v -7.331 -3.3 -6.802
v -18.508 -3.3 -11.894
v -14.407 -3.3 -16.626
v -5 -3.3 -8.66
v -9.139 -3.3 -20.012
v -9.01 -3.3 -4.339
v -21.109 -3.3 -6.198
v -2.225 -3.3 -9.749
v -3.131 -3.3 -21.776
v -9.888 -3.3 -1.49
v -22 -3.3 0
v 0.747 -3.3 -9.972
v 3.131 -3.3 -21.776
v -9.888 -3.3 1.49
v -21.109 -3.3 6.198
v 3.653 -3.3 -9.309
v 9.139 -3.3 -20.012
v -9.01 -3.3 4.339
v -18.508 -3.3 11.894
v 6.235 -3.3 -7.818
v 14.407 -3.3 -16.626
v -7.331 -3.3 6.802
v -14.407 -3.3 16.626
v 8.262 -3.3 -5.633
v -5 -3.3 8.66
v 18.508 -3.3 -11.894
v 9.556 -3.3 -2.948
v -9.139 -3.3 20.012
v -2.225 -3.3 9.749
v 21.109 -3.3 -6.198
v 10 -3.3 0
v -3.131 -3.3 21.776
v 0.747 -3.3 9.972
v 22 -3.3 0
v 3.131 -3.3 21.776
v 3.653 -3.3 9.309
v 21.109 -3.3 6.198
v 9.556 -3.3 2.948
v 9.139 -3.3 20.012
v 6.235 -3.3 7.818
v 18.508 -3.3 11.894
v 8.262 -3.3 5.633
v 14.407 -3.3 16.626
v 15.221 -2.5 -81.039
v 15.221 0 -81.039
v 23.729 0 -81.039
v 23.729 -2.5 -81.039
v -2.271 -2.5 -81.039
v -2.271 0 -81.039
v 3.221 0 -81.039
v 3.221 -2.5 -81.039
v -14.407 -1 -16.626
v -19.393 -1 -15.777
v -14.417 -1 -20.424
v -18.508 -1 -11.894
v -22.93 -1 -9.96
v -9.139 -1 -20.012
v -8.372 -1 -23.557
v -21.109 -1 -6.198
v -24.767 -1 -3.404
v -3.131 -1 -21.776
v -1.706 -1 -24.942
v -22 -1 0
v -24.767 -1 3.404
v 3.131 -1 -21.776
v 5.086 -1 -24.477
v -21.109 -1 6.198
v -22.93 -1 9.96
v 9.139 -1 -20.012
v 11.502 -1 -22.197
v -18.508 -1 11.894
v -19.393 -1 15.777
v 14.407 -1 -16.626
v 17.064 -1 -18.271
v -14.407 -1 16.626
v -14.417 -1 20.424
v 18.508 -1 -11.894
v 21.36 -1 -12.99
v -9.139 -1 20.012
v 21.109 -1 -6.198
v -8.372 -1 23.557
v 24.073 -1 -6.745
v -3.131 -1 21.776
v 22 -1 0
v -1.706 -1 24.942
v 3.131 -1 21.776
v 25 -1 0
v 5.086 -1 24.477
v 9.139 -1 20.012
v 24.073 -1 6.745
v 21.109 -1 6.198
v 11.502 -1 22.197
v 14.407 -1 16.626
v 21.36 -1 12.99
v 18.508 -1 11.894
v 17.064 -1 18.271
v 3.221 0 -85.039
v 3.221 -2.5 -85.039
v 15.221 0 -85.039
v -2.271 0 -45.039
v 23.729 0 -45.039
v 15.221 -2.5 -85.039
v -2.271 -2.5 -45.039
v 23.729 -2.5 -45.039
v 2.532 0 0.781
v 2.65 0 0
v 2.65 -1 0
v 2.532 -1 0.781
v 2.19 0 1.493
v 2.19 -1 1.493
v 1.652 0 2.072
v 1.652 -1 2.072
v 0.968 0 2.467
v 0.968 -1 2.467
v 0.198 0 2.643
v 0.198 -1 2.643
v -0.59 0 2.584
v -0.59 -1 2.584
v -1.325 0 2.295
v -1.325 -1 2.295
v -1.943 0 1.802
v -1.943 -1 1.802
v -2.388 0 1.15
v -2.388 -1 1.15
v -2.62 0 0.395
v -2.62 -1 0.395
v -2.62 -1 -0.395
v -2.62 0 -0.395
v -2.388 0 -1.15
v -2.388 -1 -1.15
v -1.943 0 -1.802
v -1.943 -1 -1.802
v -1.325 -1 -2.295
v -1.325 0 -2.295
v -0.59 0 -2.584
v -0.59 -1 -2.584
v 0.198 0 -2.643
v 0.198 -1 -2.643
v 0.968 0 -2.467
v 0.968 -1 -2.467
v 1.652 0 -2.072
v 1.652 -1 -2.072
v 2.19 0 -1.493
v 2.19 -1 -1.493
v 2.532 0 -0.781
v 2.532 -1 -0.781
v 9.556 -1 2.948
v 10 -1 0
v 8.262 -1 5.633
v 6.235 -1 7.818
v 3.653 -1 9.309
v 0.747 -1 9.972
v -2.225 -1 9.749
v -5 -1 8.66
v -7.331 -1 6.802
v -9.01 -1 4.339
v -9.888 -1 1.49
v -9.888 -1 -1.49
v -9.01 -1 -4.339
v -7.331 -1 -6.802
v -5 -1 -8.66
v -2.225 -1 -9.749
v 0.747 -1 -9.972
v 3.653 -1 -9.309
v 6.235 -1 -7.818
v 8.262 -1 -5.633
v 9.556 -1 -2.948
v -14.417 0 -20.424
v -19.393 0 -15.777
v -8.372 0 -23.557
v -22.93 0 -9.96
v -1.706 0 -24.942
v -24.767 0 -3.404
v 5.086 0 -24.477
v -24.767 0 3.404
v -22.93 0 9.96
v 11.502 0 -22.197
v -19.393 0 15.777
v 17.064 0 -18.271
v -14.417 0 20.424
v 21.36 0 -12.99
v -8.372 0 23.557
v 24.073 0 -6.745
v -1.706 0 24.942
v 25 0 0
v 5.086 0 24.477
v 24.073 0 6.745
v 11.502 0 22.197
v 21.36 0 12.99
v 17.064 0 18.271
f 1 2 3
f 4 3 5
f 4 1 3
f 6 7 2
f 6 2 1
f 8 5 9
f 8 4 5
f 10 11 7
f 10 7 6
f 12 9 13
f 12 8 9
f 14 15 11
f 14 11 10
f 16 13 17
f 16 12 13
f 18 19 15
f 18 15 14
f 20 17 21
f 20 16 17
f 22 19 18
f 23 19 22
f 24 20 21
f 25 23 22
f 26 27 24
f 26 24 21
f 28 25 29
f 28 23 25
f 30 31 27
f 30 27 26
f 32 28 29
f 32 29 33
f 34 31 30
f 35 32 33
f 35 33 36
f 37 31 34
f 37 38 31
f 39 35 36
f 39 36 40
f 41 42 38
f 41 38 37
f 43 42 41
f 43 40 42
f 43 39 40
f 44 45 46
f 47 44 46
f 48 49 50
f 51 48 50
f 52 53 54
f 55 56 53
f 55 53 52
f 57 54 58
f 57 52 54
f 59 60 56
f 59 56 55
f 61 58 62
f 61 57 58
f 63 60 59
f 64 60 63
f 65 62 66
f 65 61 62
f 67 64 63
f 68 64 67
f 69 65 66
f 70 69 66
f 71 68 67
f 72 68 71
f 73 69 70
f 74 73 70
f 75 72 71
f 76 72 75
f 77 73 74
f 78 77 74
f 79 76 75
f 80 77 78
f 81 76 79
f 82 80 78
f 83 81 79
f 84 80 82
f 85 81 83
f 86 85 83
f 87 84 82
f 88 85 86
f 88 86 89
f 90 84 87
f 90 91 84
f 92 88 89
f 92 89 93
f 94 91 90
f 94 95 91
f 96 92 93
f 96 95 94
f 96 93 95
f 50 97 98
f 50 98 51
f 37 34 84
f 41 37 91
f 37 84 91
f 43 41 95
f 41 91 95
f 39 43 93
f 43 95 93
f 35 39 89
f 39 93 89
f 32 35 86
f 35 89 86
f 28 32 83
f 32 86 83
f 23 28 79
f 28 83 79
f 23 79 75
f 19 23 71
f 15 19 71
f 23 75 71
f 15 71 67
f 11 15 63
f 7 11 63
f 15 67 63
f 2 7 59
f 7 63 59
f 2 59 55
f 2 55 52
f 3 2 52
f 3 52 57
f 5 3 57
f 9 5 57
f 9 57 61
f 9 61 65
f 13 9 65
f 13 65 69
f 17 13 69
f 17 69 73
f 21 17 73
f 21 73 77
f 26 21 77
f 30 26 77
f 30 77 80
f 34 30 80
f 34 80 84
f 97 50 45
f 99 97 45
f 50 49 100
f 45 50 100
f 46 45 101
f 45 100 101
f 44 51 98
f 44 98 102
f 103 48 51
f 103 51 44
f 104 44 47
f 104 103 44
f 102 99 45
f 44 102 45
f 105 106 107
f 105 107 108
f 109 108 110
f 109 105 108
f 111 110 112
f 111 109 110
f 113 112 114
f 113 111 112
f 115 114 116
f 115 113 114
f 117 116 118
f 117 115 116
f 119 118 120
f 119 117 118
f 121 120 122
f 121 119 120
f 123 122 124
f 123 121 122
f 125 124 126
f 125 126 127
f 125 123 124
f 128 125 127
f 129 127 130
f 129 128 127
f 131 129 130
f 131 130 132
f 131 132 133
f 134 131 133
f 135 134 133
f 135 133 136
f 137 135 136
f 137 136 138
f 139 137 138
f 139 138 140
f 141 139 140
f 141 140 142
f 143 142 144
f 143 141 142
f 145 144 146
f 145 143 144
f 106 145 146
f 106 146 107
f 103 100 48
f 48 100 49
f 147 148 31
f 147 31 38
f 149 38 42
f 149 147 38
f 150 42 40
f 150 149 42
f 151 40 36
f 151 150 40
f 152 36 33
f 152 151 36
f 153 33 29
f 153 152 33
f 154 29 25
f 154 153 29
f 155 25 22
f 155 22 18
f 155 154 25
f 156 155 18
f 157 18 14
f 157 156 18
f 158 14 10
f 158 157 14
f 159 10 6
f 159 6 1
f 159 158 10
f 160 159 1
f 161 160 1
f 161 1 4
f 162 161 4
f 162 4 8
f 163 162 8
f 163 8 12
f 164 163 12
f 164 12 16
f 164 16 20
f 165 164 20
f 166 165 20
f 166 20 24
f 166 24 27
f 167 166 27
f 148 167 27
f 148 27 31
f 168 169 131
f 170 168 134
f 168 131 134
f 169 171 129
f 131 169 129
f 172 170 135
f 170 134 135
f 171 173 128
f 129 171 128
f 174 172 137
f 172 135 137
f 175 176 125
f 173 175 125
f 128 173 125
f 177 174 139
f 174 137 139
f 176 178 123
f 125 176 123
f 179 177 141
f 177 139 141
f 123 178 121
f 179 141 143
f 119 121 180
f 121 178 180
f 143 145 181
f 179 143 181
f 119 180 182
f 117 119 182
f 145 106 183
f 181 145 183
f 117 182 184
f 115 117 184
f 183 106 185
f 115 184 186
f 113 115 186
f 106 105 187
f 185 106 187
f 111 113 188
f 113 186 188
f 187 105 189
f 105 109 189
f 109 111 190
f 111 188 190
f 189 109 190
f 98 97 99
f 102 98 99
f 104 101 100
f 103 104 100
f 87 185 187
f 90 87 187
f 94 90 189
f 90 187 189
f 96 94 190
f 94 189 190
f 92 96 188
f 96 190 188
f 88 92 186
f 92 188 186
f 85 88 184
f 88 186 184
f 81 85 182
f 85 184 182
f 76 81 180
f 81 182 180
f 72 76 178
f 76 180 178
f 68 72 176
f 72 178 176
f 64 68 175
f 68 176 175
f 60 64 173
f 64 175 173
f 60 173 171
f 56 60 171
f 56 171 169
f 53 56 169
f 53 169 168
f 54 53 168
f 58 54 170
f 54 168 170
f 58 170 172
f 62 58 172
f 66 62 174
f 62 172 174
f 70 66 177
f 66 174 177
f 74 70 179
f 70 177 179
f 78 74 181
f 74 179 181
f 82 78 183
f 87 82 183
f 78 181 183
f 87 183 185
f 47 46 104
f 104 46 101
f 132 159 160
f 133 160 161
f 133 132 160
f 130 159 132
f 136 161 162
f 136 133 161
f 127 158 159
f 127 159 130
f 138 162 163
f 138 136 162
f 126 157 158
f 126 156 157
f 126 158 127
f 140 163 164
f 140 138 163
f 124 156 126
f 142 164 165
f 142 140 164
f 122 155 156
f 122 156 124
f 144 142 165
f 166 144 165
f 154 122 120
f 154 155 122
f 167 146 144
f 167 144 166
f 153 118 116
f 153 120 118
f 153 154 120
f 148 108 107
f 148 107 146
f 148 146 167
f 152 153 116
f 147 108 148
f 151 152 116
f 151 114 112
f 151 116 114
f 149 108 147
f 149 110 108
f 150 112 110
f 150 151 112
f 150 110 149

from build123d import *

# Parameters (mm, degrees)
F0_R     = 25
F0_R_2   = 22
F0_R_3   = 10
F0_R_4   = 2.65
F1_DEPTH = 1
F2_DEPTH = 3.3
F3_W     = 12
F3_H     = 4
F4_DEPTH = 2.5


with BuildPart() as f1:
    # F0 (on Front) → F1 (new body)
    with BuildSketch(Plane.XZ):
        Circle(F0_R)
        Circle(F0_R_2, mode=Mode.SUBTRACT)
        Circle(F0_R_2)
        Circle(F0_R_3, mode=Mode.SUBTRACT)
        Circle(F0_R_3)
        Circle(F0_R_4, mode=Mode.SUBTRACT)
    extrude(amount=F1_DEPTH)

    # F0 (on Front) → F2 (join)
    with BuildSketch(Plane.XZ):
        Circle(F0_R_2)
        Circle(F0_R_3, mode=Mode.SUBTRACT)
    extrude(amount=F2_DEPTH)


with BuildPart() as f4:
    # F3 (on Front) → F4 (new body)
    with BuildSketch(Plane.XZ):
        with Locations((9.220634, -83.038755)):
            Rectangle(F3_W, F3_H)
        Polygon((23.728754, -45.038755), (-2.271246, -45.038755), (-2.271246, -81.038755), (3.220634, -81.038755), (15.220634, -81.038755), (23.728754, -81.038755), align=None)
    extrude(amount=F4_DEPTH)


solid = Compound([f1.part, f4.part])
